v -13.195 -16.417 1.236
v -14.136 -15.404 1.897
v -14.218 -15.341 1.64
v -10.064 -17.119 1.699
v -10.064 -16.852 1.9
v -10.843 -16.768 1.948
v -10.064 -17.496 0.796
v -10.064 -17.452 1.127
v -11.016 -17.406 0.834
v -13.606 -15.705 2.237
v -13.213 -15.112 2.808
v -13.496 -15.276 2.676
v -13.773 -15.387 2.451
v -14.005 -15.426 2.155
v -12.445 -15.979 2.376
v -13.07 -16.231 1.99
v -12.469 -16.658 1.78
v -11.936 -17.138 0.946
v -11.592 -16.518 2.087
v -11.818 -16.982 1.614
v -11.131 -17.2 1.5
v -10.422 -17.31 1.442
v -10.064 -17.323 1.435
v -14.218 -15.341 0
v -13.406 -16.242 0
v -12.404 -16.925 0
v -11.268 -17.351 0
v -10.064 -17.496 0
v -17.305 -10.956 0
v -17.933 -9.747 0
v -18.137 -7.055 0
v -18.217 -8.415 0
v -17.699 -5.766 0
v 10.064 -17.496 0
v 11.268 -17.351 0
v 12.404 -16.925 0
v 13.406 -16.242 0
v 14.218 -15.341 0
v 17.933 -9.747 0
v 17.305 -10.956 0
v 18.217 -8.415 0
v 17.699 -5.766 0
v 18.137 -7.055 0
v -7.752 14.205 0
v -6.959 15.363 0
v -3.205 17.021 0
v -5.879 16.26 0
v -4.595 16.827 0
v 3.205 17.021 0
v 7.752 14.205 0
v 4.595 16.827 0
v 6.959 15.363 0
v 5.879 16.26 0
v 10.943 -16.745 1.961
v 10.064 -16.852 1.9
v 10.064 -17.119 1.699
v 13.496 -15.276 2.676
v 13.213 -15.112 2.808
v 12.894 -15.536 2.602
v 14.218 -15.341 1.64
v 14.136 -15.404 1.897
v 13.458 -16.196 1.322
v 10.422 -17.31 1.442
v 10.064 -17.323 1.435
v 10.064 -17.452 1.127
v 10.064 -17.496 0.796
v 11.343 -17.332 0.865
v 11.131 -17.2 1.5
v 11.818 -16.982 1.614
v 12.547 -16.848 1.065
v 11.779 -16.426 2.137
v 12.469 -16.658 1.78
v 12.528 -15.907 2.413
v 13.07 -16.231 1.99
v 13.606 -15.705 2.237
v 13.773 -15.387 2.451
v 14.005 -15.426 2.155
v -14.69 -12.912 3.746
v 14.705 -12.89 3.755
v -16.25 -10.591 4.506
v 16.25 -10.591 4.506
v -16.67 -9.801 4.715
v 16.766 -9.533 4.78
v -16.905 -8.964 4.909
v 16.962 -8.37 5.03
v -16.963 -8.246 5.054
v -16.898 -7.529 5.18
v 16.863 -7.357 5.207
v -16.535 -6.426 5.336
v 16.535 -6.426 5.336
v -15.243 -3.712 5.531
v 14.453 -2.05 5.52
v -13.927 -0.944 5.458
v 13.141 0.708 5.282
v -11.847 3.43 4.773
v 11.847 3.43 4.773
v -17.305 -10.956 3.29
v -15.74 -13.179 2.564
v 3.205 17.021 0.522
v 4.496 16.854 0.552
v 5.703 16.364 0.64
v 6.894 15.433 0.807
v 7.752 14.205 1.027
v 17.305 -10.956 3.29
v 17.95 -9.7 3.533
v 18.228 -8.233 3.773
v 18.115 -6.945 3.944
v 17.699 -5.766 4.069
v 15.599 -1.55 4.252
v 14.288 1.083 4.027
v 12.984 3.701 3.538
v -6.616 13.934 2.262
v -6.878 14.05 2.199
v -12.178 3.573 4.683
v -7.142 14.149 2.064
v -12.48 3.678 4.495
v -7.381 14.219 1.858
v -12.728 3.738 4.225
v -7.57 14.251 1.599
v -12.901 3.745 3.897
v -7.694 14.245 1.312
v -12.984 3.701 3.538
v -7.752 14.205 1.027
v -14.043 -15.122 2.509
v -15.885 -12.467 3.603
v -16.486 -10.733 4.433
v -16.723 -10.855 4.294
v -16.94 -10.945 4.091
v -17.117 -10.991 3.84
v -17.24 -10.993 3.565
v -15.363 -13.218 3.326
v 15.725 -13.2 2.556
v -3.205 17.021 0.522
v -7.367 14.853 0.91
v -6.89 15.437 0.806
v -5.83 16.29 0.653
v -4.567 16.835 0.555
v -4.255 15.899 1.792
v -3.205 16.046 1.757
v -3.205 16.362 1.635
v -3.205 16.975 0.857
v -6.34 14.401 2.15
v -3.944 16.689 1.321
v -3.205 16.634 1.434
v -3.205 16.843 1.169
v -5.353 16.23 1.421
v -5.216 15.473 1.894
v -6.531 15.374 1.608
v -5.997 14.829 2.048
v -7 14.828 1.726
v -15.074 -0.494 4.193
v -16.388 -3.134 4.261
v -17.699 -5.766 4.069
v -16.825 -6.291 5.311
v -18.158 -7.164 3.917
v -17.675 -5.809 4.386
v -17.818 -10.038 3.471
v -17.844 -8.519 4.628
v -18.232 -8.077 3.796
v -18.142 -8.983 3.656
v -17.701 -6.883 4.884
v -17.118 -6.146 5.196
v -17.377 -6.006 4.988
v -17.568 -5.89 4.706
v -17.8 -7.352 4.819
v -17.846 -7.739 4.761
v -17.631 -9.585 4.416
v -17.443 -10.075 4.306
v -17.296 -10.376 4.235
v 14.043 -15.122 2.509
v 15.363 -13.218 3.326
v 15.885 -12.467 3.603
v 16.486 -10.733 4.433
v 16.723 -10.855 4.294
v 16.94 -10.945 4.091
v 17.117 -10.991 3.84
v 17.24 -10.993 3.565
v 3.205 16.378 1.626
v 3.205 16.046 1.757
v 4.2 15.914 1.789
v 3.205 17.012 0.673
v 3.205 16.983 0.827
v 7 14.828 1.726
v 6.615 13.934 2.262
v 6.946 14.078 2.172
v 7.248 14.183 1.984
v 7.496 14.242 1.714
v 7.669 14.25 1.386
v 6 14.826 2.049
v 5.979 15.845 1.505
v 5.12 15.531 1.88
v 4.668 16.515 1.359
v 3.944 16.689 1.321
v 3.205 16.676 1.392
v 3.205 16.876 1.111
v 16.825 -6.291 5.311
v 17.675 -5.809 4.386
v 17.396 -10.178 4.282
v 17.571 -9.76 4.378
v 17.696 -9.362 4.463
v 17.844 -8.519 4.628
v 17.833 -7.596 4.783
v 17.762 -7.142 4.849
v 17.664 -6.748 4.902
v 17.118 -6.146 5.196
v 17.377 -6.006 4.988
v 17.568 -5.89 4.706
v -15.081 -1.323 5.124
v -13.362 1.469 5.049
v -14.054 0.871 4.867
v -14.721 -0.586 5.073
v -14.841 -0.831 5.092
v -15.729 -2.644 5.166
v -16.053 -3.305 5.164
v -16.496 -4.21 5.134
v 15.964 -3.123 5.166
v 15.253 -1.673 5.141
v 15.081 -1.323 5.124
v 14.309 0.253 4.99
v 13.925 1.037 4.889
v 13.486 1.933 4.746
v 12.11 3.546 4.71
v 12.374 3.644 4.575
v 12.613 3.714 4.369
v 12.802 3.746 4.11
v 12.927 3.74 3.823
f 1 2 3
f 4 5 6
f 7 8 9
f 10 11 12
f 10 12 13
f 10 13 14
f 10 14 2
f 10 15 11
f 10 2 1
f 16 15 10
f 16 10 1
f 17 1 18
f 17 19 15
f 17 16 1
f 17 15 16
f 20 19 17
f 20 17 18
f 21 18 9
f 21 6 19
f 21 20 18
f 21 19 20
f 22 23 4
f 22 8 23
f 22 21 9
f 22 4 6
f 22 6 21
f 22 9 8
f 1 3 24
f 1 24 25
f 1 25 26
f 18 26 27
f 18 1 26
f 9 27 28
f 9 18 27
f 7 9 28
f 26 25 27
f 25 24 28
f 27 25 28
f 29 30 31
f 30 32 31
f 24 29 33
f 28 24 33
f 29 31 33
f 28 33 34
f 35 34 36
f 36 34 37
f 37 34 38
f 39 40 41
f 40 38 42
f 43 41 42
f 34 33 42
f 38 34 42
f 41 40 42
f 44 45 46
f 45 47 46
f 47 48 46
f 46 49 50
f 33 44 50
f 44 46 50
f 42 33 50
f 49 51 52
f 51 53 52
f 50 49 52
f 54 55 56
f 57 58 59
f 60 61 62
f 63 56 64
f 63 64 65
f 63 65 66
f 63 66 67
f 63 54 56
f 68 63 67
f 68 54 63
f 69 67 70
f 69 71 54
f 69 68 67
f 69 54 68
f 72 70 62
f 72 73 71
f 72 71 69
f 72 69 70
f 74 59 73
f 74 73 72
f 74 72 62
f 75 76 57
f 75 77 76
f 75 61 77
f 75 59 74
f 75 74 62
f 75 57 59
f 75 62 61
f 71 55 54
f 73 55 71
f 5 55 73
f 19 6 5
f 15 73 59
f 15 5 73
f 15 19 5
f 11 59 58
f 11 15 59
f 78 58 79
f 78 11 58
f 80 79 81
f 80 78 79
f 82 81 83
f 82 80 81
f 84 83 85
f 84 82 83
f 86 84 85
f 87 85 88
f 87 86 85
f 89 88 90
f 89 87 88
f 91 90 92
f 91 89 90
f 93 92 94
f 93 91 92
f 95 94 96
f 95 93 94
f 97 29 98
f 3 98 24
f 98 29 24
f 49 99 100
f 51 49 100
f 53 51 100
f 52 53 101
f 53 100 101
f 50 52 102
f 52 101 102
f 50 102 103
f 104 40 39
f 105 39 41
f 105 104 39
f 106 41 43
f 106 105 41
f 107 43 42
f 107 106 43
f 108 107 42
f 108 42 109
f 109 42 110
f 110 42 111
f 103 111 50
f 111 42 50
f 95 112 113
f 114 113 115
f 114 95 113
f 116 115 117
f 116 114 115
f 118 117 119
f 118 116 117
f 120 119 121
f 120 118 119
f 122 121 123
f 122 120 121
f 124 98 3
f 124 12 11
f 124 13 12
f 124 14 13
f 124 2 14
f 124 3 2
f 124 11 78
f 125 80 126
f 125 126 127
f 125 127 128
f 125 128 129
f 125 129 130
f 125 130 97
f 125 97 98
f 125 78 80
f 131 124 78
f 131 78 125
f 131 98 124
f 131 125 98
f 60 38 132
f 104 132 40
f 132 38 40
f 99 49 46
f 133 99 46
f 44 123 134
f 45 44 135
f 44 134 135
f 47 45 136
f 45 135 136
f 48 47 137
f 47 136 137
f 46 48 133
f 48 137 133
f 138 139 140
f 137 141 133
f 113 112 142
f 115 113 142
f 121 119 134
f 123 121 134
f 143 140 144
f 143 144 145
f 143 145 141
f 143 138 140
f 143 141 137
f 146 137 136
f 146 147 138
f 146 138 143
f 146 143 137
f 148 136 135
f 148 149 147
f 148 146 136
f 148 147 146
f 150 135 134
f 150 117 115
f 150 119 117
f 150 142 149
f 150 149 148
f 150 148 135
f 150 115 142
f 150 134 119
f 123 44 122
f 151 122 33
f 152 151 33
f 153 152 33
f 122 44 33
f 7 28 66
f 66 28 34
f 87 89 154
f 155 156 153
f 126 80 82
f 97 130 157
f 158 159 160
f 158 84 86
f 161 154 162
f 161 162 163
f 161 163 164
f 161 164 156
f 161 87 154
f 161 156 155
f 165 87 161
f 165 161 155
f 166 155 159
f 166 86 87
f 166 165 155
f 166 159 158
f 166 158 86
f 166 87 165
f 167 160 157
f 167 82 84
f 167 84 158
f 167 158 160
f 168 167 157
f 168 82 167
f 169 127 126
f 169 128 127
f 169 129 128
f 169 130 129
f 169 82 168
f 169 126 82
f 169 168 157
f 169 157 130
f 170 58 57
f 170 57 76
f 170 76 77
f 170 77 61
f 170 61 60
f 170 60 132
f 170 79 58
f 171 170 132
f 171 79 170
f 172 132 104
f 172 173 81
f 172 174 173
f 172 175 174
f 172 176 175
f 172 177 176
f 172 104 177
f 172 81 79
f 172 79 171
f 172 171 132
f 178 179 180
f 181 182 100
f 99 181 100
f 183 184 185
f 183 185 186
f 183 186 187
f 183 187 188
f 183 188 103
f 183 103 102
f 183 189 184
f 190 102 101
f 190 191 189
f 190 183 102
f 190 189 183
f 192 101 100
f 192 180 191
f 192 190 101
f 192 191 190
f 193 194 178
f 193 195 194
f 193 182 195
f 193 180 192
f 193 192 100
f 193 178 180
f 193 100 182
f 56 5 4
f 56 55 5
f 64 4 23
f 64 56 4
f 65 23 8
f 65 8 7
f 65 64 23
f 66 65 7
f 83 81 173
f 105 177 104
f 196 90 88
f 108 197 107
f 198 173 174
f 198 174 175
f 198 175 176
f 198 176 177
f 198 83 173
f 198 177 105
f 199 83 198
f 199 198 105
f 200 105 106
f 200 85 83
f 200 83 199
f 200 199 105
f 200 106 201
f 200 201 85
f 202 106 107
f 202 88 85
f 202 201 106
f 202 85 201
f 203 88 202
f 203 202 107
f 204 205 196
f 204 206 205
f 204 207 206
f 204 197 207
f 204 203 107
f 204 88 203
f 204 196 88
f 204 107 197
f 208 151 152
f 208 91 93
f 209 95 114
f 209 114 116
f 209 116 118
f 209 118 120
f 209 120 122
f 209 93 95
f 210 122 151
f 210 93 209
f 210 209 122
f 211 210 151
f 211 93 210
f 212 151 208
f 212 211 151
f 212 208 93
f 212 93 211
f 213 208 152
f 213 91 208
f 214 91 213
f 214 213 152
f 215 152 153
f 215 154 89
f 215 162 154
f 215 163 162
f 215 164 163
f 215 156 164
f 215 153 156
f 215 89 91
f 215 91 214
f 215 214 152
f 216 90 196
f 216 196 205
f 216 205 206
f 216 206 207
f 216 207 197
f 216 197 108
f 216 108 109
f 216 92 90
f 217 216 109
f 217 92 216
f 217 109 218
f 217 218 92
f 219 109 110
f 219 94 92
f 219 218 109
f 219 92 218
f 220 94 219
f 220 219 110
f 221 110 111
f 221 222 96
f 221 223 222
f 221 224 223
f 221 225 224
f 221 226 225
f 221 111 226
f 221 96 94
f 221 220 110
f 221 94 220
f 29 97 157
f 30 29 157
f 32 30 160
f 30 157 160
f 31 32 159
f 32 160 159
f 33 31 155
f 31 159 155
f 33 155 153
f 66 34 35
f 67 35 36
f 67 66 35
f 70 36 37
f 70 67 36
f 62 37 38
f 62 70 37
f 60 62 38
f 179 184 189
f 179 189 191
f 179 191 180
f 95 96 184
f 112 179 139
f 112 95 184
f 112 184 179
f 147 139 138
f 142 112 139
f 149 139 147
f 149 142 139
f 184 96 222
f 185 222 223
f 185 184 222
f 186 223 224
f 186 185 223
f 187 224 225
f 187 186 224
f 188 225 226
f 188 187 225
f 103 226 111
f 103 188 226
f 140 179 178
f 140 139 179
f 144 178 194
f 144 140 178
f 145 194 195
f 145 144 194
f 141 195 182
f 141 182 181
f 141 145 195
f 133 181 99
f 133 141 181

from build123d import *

# Parameters (mm, degrees)
F1_DEPTH    = 7.62
F2_SIZE2    = 6.096
F2_SIZE     = 9.017
F3_T1_DEPTH = 145.1738679331
F4_R        = 5.08
F5_T1_DEPTH = 97.646763874
F6_R        = 1.27


# Not quite as in the source:
# - a fillet or chamfer that OpenCascade refuses, or shapes differently, is made with other operations: its cross-section is extruded or revolved along the edge and cut away or added


with BuildPart() as f1:
    # F0 (on Top) → F1 (new body)
    with BuildSketch(Plane.XY):
        Polygon((-19.05, -8.4781497717), (-12.7, -17.4958198279), (12.7, -17.4958198279), (19.05, -8.4781497717), (6.35, 17.0205775648), (-6.35, 17.0205775648), align=None)
    extrude(amount=F1_DEPTH)

    # F2
    f2_edges = [f1.edges().sort_by_distance(p)[0] for p in [
        (0, -17.49582, 7.62),
    ]]
    f2_side = f1.faces().sort_by_distance((0, -2.400647, 7.62))[0]
    chamfer(f2_edges, length=F2_SIZE, length2=F2_SIZE2, reference=f2_side)

    # F3: chamfer of 25.5016 x 6.096 on 1 edges, made by hand

    # F3_s2 → F3_t1 (cut)
    with BuildSketch(Plane.YZ.offset(-72.5869339665)):
        Polygon((-8.4810224352, 7.62), (17.0205775648, 1.524), (17.0205775648, 7.62), align=None)
    extrude(amount=F3_T1_DEPTH, mode=Mode.SUBTRACT)

    # F4
    f4_edges = [f1.edges().sort_by_distance(p)[0] for p in [
        (19.05, -8.47815, 3.809657),
        (12.7, -17.49582, 0.762),
        (-12.7, -17.49582, 0.762),
        (-19.05, -8.47815, 3.809657),
        (6.35, 17.020578, 0.762),
        (-6.35, 17.020578, 0.762),
    ]]
    fillet(f4_edges, radius=F4_R)

    # F5: fillet of radius 27.94 on 1 edges, made by hand

    # F5_s2 → F5_t1 (cut)
    with BuildSketch(Plane.YZ.offset(-48.823381937)):
        with BuildLine():
            ThreePointArc((-17.4958198279, 1.524), (-7.3528274709, 5.2076739368), (3.4295965216, 4.77284009))
            Line((3.4295965216, 4.77284009), (-8.4793951963, 7.6196110186))
            Line((-8.4793951963, 7.6196110186), (-17.4958198279, 1.524))
        make_face()
    extrude(amount=F5_T1_DEPTH, mode=Mode.SUBTRACT)

    # F6
    f6_edges = [f1.edges().sort_by_distance(p)[0] for p in [
        (0, -17.49582, 1.524),
        (-15.736261, -13.184009, 3.642167),
        (-18.210711, -8.494691, 5.006042),
        (-12.356582, -16.949127, 1.845308),
        (-15.396033, -1.141811, 5.472098),
        (15.396033, -1.141811, 5.472098),
        (18.210711, -8.494691, 5.006042),
        (15.736261, -13.184009, 3.642167),
        (12.356317, -16.949258, 1.845234),
        (-10.435665, 8.817487, 3.484898),
        (-5.879006, 16.259813, 1.705856),
        (0, 17.020578, 1.524),
        (5.879006, 16.259813, 1.705856),
        (10.435665, 8.817487, 3.484898),
    ]]
    fillet(f6_edges, radius=F6_R)


solid = f1.part
